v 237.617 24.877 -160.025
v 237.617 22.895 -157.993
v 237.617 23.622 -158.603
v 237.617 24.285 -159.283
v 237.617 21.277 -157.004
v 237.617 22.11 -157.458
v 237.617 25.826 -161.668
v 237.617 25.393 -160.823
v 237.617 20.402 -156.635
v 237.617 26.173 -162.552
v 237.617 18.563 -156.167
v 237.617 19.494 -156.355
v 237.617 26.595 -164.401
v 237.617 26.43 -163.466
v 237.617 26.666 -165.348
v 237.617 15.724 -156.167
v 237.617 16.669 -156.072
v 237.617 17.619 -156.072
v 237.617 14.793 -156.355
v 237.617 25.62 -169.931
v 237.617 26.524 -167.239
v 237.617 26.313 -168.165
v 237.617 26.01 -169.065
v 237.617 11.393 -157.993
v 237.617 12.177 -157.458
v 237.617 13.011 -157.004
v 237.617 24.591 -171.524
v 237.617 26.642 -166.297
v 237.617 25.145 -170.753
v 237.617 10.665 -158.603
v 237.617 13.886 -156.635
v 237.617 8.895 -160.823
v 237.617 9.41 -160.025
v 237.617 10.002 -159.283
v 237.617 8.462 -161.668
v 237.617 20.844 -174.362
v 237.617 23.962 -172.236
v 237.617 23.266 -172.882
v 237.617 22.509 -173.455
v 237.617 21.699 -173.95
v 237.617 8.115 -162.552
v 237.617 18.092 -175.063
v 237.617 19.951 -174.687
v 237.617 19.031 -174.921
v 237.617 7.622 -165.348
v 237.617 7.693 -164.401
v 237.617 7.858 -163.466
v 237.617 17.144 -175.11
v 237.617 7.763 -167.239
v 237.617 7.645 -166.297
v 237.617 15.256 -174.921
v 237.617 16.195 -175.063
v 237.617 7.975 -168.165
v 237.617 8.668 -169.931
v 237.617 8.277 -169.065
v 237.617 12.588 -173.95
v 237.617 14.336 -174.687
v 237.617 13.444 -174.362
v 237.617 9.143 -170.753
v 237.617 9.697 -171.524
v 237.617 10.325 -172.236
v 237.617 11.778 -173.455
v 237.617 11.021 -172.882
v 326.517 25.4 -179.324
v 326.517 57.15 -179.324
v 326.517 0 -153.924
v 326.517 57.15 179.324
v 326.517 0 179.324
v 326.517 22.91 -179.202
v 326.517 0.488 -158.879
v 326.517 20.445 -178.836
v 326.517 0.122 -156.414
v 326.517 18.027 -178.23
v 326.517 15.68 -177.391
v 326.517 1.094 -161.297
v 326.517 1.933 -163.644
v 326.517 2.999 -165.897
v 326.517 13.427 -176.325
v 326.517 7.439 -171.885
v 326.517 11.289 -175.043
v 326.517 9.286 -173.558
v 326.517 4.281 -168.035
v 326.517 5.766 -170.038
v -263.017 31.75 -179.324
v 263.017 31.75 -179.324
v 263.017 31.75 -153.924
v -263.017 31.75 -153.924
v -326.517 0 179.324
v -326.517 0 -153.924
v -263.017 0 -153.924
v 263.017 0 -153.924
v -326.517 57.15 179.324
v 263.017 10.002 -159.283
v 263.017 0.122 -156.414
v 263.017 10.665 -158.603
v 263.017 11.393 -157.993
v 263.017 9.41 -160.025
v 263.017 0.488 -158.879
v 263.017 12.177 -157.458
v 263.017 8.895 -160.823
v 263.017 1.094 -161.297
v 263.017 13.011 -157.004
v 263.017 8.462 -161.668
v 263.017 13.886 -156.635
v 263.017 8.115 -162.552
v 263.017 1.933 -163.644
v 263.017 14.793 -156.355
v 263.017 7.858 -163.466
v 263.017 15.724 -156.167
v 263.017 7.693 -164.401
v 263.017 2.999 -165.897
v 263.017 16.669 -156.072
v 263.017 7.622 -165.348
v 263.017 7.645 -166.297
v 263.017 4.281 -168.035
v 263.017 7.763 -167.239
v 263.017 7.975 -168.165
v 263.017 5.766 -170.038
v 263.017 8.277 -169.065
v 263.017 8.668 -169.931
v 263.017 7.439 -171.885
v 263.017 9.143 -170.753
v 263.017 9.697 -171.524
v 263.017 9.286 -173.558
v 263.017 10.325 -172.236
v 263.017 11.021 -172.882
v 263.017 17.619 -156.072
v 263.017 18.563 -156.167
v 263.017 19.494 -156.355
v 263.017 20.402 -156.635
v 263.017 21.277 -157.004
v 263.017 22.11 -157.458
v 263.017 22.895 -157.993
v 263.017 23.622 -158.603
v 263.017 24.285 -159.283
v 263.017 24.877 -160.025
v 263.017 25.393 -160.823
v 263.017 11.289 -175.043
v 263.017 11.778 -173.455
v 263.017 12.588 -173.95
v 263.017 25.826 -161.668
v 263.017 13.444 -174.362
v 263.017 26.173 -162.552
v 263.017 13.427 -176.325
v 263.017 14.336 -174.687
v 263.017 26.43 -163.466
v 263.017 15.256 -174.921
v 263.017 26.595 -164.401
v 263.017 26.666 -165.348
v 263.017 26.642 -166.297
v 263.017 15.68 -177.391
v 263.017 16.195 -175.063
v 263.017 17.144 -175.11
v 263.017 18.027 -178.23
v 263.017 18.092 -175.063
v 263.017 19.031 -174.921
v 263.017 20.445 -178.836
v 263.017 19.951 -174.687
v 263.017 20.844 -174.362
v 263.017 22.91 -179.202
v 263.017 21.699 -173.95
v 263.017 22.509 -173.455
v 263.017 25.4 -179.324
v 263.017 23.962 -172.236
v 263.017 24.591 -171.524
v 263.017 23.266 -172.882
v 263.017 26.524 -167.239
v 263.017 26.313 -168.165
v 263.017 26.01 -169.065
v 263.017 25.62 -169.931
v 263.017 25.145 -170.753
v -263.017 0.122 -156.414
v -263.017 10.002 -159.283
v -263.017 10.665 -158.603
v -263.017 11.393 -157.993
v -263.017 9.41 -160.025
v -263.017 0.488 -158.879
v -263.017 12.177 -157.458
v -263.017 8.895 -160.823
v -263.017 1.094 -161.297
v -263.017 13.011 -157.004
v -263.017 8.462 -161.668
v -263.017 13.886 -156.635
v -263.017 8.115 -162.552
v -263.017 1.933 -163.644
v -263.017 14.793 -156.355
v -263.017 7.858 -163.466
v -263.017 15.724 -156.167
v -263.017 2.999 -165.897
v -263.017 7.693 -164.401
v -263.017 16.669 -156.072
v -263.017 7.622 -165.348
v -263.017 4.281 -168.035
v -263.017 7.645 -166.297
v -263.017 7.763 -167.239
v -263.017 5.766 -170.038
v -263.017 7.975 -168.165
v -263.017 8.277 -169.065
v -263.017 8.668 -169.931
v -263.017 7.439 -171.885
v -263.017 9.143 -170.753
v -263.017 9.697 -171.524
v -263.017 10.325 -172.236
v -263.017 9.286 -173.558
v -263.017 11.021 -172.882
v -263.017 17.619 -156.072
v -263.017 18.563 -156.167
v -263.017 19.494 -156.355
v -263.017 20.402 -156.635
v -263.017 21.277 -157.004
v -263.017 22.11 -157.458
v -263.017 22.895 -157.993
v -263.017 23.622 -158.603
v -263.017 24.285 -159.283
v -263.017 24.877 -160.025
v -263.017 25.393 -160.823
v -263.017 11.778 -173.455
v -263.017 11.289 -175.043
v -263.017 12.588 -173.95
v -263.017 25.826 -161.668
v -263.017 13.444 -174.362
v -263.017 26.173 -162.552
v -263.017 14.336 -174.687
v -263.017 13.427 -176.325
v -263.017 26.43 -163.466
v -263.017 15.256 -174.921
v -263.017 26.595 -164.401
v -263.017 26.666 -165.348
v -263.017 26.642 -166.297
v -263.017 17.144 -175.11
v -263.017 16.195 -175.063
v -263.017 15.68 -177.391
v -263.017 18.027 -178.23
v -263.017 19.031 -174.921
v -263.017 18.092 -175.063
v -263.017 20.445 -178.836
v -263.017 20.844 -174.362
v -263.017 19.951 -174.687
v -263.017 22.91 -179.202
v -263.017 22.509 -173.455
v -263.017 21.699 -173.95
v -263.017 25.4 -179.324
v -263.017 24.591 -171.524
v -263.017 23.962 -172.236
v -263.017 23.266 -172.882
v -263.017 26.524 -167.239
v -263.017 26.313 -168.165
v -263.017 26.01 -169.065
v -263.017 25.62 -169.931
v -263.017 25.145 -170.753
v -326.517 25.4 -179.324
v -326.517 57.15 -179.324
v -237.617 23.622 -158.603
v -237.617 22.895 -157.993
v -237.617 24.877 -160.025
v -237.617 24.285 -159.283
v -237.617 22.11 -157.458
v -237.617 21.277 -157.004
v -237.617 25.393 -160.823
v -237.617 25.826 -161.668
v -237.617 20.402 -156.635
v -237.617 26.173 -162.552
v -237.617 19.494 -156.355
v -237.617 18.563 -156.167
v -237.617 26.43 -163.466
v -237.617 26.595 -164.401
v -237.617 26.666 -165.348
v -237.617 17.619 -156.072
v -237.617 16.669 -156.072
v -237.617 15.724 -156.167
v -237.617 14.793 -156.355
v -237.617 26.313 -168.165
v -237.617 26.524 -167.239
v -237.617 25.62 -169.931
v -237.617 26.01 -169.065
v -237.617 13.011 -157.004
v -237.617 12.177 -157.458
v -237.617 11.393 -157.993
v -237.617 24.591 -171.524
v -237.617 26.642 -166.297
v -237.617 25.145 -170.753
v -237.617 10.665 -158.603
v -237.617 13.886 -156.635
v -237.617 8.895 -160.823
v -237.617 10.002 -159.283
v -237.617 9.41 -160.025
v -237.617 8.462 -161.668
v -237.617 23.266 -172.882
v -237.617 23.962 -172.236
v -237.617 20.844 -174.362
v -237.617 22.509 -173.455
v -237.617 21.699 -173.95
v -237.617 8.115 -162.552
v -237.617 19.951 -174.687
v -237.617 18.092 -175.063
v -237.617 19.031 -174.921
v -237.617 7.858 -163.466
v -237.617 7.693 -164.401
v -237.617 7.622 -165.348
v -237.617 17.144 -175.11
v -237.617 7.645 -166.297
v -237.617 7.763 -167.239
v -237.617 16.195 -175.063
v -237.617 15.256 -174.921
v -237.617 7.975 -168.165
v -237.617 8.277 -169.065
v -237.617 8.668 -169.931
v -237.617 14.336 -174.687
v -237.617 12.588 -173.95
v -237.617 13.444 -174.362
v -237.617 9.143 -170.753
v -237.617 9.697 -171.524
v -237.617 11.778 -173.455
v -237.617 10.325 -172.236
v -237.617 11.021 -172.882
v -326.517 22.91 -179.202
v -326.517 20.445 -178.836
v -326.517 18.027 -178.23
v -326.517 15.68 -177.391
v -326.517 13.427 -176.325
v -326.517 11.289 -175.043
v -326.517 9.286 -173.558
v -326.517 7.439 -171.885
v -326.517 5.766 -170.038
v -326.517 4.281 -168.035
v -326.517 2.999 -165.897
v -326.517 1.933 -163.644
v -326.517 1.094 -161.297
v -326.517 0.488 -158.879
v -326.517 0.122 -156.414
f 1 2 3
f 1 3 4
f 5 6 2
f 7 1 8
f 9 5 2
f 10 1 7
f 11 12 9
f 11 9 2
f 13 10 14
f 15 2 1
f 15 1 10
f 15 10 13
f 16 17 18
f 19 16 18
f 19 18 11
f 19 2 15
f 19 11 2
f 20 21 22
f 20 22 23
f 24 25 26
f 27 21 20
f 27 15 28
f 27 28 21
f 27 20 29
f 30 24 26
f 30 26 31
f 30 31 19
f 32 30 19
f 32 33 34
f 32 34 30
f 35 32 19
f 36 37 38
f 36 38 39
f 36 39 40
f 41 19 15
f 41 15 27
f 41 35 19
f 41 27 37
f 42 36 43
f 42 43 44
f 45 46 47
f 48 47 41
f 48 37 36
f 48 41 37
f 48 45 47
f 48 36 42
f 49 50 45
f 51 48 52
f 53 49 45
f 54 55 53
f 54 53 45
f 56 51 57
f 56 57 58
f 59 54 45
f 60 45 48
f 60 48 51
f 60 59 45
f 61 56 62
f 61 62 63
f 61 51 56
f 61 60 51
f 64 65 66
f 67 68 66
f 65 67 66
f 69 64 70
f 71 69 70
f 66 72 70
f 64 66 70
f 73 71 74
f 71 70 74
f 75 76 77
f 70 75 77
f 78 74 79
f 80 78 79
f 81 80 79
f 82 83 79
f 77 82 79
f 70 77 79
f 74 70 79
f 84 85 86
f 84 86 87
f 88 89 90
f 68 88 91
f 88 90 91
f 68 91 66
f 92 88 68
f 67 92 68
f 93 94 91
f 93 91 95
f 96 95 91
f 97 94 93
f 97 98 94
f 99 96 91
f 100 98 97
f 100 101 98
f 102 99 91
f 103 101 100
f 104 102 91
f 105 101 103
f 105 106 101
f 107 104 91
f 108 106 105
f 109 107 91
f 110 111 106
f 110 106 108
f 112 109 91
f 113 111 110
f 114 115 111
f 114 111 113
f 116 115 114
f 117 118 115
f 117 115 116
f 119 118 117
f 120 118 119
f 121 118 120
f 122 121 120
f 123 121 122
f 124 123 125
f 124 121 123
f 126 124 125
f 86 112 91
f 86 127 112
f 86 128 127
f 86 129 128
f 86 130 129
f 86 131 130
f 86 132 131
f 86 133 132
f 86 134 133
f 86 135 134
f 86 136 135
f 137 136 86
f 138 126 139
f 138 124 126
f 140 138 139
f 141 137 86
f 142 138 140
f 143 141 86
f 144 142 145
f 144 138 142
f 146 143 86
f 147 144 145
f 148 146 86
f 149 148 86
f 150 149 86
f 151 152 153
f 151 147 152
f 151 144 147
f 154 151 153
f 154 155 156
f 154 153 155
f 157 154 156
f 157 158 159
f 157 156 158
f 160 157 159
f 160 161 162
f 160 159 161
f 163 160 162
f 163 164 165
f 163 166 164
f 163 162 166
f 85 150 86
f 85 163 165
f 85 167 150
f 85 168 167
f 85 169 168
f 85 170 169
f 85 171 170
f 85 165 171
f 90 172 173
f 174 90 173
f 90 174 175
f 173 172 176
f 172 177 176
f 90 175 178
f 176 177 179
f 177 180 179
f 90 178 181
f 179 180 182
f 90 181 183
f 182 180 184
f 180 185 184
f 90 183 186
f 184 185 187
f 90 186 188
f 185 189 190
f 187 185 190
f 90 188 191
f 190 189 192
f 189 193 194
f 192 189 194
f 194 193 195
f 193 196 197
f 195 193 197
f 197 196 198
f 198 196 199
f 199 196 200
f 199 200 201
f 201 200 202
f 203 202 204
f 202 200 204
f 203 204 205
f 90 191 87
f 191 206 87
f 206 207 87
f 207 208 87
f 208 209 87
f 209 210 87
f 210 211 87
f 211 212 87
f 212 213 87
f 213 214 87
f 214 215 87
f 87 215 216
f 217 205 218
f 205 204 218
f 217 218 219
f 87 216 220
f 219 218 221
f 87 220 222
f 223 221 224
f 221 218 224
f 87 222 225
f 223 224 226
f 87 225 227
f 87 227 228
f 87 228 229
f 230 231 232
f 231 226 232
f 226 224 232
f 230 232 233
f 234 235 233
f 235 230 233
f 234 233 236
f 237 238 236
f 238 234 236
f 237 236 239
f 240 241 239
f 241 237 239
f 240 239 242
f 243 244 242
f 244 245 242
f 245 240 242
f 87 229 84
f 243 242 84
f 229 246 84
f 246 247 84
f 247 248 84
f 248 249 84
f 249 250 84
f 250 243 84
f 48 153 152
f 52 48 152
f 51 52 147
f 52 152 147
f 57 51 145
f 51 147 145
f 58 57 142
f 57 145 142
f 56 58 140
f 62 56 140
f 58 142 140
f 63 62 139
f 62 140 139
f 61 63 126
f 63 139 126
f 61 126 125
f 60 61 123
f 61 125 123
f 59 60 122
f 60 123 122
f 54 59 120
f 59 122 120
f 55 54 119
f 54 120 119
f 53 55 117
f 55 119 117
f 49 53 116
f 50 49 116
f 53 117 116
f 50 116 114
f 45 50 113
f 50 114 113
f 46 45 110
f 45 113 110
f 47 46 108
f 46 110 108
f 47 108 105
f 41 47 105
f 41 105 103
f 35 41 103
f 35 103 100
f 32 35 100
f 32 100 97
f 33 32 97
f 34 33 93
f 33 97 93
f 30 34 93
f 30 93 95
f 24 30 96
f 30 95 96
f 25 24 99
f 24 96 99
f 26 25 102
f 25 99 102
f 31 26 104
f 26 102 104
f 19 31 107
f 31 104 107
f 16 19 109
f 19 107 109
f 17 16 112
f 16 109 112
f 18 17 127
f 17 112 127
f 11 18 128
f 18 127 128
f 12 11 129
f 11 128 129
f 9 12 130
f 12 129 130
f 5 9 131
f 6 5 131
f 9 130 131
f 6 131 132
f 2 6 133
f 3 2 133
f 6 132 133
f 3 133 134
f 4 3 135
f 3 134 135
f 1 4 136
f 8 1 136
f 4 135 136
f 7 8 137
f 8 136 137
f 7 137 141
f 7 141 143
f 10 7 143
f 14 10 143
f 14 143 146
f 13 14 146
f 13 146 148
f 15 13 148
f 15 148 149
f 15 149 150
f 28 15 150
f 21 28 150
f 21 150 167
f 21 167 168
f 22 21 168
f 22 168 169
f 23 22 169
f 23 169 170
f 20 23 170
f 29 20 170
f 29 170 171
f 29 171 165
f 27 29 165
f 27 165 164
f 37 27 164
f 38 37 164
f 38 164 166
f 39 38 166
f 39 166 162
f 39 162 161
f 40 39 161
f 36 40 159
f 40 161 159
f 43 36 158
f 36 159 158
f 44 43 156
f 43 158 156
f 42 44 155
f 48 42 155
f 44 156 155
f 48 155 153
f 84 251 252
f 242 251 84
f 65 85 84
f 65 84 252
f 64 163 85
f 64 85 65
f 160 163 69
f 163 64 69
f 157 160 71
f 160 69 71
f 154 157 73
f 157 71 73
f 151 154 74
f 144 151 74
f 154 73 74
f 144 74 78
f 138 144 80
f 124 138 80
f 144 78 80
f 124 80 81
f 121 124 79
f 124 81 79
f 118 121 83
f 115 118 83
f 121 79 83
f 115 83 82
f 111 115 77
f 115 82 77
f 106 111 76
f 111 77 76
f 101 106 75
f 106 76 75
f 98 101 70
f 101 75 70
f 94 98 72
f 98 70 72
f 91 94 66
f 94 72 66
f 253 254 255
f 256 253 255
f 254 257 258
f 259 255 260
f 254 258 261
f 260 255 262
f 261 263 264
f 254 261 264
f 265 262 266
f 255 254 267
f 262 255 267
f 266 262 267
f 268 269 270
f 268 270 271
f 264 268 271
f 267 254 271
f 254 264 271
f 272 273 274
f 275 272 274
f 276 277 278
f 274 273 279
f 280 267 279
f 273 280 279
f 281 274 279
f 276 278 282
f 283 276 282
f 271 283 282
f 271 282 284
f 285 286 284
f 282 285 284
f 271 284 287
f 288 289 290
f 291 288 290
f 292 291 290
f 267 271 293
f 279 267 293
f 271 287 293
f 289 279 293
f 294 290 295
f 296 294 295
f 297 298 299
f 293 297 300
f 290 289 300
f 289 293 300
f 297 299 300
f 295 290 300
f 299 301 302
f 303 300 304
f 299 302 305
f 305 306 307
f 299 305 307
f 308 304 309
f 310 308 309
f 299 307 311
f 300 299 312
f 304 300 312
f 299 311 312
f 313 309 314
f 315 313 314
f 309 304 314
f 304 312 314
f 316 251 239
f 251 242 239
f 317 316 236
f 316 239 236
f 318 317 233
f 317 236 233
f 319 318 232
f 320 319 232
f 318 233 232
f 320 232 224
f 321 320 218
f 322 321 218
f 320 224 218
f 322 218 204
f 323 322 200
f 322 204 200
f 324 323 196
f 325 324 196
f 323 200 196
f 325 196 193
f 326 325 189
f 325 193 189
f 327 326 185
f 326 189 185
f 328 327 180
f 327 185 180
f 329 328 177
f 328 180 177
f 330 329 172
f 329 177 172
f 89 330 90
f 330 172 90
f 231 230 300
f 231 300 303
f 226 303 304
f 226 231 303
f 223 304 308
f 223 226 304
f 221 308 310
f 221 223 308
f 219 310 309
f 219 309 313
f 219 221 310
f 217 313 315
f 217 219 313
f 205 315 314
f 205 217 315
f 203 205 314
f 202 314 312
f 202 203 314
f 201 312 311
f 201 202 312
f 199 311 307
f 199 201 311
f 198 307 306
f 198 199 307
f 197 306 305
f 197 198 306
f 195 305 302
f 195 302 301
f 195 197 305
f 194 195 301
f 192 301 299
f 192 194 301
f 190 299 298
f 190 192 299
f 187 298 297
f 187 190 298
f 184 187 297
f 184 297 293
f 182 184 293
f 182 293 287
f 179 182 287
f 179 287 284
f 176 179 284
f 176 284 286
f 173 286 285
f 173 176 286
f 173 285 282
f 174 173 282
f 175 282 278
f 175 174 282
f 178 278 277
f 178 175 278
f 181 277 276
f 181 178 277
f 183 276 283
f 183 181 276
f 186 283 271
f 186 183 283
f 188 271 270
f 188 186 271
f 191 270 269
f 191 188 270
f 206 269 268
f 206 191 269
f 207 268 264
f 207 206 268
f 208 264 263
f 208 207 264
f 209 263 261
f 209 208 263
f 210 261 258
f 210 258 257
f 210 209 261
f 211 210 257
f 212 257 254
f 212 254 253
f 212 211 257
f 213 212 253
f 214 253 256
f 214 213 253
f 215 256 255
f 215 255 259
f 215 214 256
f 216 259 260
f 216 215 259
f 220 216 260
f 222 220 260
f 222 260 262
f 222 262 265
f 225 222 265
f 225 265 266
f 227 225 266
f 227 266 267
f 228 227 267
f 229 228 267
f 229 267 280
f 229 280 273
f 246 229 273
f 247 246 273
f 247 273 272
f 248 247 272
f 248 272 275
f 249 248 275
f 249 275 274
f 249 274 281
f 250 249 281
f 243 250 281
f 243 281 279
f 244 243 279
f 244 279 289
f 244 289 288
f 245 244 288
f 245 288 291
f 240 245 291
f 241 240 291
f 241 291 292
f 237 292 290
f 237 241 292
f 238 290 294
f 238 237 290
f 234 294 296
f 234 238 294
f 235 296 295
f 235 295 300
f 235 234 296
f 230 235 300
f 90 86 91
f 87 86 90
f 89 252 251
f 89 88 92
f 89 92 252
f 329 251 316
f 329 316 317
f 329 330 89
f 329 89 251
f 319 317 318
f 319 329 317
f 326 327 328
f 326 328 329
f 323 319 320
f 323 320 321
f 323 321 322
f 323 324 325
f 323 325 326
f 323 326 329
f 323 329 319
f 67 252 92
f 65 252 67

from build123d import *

# Parameters (mm, degrees)
SKETCH2_W           = 653.034
SKETCH2_H           = 358.648
BOSS_EXTRUDE1_DEPTH = 57.15
SKETCH3_W           = 526.034
SKETCH3_H           = 31.75
CUT_EXTRUDE1_DEPTH  = 25.4
SKETCH4_R           = 9.525
BOSS_EXTRUDE2_DEPTH = 25.4
FILLET1_R           = 25.4


with BuildPart() as part:
    # Sketch2 → Boss-Extrude1 (new body)
    with BuildSketch(Plane(origin=(0, 0, 0), x_dir=(1, 0, 0), z_dir=(0, 1, 0))):
        Rectangle(SKETCH2_W, SKETCH2_H)
    extrude(amount=BOSS_EXTRUDE1_DEPTH)

    # Sketch3 → Cut-Extrude1 (cut)
    with BuildSketch(Plane(origin=(0, 0, -179.324), x_dir=(-1, 0, 0), z_dir=(0, 0, -1))):
        with Locations((0, 15.875)):
            Rectangle(SKETCH3_W, SKETCH3_H)
    extrude(amount=-CUT_EXTRUDE1_DEPTH, mode=Mode.SUBTRACT)

    # Sketch4 → Boss-Extrude2 (add)
    with BuildSketch(Plane.ZY.offset(-263.017)):
        with Locations(Location((-165.585268519, 17.143786042, 0), (0, 0, 180))):
            Circle(SKETCH4_R)
    boss_extrude2 = extrude(amount=BOSS_EXTRUDE2_DEPTH)

    # Mirror1: Boss-Extrude2 across plane
    add(boss_extrude2.mirror(Plane.ZY))

    # Fillet1
    fillet1_edges = [part.edges().sort_by_distance(p)[0] for p in [
        (-294.767, 0, -179.324),
        (294.767, 0, -179.324),
    ]]
    fillet(fillet1_edges, radius=FILLET1_R)


solid = part.part
